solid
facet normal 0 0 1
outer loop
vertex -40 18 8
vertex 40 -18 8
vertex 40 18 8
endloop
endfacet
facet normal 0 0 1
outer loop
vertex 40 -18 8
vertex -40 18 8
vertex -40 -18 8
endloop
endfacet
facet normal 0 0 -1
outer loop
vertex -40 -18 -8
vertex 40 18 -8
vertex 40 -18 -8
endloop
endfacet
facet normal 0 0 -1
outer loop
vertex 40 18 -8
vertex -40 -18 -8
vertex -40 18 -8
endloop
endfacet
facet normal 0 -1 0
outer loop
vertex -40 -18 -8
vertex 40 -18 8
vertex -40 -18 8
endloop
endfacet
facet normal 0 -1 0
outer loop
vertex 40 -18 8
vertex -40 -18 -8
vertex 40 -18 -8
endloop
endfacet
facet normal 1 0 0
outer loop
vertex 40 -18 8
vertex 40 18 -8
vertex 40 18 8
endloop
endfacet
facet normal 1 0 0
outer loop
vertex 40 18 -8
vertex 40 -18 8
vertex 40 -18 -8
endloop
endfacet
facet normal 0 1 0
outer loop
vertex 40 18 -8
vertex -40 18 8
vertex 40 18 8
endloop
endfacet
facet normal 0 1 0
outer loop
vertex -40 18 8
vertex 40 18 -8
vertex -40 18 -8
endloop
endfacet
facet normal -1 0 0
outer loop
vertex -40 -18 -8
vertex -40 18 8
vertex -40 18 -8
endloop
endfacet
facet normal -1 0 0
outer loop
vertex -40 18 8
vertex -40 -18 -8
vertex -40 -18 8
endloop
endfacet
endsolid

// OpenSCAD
// Starter file for task-003.
// Edit this file in OpenSCAD to complete the requested hard task.
$fn = 64;

block_w = 80;
block_d = 36;
block_h = 16;

cube([block_w, block_d, block_h], center=true);
